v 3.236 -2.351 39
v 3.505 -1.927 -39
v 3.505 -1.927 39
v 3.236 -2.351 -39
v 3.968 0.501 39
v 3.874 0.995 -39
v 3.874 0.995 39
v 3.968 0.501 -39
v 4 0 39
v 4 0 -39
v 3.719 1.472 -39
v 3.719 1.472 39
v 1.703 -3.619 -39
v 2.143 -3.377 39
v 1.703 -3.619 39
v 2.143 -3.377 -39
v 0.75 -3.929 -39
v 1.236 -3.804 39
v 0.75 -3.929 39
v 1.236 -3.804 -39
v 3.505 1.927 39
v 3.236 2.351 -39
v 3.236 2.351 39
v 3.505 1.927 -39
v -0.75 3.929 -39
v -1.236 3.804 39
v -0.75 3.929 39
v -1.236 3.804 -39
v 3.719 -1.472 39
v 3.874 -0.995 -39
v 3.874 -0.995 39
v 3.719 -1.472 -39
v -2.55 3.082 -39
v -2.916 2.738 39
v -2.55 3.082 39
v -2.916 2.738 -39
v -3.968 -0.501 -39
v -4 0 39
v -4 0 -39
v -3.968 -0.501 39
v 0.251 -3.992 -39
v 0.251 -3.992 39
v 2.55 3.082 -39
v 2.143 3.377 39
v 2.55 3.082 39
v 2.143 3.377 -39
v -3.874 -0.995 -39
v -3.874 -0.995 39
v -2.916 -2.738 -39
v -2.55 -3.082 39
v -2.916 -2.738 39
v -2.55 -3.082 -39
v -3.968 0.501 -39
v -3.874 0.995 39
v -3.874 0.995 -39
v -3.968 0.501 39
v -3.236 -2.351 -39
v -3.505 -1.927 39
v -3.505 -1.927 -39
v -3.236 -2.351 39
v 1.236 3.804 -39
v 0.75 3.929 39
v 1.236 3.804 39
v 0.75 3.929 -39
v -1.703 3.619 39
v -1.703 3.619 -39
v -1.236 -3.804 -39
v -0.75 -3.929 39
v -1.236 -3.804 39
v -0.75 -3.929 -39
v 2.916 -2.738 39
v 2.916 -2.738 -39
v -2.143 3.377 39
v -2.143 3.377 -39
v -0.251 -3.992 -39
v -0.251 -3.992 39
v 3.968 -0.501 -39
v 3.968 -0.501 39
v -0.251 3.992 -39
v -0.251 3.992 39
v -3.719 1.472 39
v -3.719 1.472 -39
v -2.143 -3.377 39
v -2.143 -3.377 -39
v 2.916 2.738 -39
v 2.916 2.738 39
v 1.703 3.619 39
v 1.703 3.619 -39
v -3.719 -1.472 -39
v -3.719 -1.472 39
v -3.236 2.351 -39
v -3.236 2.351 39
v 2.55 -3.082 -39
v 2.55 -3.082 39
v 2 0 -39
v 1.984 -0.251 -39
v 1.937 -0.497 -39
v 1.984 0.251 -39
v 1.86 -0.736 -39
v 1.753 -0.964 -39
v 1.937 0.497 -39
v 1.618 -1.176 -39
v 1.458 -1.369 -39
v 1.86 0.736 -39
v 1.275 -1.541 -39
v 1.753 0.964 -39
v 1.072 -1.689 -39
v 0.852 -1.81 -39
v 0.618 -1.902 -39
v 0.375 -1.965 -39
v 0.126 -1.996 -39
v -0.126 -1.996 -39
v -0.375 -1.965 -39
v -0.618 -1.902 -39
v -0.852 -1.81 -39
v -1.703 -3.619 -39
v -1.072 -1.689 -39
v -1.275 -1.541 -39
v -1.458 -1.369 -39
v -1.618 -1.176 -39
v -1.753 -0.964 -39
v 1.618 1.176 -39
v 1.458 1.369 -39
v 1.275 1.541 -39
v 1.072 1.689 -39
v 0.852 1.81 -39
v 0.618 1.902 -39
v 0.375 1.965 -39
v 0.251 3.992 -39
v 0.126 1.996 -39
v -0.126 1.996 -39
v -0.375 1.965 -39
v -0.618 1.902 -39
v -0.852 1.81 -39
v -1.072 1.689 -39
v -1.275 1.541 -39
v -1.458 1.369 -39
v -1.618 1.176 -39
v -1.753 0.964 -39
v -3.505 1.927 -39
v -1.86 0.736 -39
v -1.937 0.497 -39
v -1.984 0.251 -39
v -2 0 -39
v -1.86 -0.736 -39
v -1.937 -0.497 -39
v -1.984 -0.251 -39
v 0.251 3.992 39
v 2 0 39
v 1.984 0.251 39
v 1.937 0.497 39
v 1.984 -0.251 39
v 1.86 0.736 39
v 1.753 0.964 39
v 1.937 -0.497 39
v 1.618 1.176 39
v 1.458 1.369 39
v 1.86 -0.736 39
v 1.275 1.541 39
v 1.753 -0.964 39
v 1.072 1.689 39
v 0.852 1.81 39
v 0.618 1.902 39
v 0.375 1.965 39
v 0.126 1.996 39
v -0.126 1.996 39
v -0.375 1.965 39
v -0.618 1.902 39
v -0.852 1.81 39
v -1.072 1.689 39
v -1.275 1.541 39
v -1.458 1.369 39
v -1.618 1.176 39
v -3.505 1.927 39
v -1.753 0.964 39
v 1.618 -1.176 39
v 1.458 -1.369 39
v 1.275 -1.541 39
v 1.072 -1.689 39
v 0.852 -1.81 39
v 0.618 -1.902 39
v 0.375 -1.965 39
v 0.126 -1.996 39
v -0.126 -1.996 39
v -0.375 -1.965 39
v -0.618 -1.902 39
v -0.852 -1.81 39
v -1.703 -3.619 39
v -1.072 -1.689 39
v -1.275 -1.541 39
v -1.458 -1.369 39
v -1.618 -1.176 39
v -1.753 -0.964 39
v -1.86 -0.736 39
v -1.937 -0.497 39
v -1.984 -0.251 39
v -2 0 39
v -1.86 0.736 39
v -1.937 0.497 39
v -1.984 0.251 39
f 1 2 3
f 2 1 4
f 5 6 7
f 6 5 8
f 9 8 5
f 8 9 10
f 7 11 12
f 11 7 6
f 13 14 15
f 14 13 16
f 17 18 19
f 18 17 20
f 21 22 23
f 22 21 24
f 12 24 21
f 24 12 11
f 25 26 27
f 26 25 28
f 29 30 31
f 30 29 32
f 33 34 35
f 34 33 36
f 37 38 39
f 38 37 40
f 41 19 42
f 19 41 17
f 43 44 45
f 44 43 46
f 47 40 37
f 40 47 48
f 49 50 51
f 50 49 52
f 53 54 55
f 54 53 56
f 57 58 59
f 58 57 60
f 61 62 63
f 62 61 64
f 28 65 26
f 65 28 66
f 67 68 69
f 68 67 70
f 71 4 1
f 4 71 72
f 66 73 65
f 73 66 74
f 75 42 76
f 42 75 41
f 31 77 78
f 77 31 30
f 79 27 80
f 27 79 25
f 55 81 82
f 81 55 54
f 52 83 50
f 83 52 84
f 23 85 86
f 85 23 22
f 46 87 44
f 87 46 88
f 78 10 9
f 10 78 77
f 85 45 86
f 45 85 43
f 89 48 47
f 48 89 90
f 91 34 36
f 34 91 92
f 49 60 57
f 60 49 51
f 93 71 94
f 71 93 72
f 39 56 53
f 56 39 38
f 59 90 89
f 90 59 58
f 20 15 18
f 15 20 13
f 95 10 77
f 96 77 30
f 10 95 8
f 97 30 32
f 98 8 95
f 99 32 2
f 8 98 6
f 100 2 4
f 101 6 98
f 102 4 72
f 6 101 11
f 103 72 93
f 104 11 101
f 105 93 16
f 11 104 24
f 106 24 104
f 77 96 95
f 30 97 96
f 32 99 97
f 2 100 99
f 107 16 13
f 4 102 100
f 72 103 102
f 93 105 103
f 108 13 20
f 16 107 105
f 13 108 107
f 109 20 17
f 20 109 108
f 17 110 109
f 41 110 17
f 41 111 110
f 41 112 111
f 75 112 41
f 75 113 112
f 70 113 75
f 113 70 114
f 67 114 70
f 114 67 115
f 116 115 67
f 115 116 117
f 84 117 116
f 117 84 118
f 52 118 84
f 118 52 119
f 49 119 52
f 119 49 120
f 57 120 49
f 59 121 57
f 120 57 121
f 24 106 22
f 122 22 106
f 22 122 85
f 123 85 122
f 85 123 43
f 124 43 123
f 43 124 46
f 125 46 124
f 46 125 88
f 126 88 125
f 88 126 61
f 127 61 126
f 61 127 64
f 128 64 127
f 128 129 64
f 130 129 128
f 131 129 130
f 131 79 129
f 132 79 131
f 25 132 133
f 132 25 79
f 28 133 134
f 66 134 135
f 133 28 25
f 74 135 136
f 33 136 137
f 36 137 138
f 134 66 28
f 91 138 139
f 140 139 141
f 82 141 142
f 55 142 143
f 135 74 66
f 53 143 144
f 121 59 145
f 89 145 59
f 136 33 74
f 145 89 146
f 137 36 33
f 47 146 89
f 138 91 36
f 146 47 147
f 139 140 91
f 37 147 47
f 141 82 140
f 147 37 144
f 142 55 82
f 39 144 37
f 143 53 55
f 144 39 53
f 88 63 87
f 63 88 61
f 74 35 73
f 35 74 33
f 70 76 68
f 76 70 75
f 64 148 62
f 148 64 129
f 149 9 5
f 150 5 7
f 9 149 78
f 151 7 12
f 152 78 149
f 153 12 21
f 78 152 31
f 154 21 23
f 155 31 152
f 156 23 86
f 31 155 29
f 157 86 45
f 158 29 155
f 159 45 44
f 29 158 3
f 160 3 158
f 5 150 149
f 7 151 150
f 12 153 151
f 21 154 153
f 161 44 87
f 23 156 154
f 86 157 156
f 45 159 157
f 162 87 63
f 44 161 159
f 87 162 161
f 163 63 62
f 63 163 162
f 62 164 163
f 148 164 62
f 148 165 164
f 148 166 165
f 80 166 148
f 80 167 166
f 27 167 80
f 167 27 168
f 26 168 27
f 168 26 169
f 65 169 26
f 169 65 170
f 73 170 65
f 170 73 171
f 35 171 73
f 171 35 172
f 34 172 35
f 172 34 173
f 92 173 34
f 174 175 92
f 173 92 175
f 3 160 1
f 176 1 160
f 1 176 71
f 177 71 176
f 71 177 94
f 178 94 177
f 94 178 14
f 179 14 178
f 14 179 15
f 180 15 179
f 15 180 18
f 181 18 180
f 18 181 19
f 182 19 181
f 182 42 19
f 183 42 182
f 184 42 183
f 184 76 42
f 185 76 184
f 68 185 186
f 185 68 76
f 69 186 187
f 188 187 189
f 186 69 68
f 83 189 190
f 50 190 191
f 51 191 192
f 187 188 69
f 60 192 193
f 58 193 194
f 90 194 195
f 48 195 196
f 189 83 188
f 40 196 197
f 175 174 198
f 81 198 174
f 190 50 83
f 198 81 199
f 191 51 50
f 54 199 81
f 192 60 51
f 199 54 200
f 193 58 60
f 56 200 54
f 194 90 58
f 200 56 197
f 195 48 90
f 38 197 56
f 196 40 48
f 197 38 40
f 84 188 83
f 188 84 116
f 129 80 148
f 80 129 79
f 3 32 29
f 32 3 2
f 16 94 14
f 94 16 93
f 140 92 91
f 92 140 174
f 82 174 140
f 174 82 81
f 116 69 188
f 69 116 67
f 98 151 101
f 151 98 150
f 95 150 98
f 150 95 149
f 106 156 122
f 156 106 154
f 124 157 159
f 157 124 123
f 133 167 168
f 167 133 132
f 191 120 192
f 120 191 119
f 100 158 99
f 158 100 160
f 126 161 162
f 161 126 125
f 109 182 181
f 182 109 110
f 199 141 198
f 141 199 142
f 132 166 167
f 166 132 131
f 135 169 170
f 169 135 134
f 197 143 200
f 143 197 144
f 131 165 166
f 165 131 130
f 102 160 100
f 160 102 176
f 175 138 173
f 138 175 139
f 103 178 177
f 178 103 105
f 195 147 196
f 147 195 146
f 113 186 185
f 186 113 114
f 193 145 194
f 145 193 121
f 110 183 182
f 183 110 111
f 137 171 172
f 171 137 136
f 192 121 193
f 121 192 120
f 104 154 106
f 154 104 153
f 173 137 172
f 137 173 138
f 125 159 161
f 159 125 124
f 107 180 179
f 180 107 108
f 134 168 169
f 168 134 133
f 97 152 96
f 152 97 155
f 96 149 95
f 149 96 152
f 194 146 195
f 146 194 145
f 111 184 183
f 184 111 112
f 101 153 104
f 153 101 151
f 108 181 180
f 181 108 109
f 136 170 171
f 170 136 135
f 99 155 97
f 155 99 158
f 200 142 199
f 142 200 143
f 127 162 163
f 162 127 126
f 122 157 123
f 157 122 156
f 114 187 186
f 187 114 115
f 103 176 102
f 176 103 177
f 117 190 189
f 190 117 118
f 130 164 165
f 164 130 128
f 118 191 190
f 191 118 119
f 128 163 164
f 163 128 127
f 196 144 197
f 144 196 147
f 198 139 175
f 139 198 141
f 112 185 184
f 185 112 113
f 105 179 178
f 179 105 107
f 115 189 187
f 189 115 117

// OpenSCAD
$fn = 50;


difference() {
	union() {
		translate(v = [0, 0, -39.0000000000]) {
			cylinder(h = 78, r = 4.0000000000);
		}
	}
	union() {
		translate(v = [0, 0, -100.0000000000]) {
			cylinder(h = 200, r = 2.0000000000);
		}
	}
}
